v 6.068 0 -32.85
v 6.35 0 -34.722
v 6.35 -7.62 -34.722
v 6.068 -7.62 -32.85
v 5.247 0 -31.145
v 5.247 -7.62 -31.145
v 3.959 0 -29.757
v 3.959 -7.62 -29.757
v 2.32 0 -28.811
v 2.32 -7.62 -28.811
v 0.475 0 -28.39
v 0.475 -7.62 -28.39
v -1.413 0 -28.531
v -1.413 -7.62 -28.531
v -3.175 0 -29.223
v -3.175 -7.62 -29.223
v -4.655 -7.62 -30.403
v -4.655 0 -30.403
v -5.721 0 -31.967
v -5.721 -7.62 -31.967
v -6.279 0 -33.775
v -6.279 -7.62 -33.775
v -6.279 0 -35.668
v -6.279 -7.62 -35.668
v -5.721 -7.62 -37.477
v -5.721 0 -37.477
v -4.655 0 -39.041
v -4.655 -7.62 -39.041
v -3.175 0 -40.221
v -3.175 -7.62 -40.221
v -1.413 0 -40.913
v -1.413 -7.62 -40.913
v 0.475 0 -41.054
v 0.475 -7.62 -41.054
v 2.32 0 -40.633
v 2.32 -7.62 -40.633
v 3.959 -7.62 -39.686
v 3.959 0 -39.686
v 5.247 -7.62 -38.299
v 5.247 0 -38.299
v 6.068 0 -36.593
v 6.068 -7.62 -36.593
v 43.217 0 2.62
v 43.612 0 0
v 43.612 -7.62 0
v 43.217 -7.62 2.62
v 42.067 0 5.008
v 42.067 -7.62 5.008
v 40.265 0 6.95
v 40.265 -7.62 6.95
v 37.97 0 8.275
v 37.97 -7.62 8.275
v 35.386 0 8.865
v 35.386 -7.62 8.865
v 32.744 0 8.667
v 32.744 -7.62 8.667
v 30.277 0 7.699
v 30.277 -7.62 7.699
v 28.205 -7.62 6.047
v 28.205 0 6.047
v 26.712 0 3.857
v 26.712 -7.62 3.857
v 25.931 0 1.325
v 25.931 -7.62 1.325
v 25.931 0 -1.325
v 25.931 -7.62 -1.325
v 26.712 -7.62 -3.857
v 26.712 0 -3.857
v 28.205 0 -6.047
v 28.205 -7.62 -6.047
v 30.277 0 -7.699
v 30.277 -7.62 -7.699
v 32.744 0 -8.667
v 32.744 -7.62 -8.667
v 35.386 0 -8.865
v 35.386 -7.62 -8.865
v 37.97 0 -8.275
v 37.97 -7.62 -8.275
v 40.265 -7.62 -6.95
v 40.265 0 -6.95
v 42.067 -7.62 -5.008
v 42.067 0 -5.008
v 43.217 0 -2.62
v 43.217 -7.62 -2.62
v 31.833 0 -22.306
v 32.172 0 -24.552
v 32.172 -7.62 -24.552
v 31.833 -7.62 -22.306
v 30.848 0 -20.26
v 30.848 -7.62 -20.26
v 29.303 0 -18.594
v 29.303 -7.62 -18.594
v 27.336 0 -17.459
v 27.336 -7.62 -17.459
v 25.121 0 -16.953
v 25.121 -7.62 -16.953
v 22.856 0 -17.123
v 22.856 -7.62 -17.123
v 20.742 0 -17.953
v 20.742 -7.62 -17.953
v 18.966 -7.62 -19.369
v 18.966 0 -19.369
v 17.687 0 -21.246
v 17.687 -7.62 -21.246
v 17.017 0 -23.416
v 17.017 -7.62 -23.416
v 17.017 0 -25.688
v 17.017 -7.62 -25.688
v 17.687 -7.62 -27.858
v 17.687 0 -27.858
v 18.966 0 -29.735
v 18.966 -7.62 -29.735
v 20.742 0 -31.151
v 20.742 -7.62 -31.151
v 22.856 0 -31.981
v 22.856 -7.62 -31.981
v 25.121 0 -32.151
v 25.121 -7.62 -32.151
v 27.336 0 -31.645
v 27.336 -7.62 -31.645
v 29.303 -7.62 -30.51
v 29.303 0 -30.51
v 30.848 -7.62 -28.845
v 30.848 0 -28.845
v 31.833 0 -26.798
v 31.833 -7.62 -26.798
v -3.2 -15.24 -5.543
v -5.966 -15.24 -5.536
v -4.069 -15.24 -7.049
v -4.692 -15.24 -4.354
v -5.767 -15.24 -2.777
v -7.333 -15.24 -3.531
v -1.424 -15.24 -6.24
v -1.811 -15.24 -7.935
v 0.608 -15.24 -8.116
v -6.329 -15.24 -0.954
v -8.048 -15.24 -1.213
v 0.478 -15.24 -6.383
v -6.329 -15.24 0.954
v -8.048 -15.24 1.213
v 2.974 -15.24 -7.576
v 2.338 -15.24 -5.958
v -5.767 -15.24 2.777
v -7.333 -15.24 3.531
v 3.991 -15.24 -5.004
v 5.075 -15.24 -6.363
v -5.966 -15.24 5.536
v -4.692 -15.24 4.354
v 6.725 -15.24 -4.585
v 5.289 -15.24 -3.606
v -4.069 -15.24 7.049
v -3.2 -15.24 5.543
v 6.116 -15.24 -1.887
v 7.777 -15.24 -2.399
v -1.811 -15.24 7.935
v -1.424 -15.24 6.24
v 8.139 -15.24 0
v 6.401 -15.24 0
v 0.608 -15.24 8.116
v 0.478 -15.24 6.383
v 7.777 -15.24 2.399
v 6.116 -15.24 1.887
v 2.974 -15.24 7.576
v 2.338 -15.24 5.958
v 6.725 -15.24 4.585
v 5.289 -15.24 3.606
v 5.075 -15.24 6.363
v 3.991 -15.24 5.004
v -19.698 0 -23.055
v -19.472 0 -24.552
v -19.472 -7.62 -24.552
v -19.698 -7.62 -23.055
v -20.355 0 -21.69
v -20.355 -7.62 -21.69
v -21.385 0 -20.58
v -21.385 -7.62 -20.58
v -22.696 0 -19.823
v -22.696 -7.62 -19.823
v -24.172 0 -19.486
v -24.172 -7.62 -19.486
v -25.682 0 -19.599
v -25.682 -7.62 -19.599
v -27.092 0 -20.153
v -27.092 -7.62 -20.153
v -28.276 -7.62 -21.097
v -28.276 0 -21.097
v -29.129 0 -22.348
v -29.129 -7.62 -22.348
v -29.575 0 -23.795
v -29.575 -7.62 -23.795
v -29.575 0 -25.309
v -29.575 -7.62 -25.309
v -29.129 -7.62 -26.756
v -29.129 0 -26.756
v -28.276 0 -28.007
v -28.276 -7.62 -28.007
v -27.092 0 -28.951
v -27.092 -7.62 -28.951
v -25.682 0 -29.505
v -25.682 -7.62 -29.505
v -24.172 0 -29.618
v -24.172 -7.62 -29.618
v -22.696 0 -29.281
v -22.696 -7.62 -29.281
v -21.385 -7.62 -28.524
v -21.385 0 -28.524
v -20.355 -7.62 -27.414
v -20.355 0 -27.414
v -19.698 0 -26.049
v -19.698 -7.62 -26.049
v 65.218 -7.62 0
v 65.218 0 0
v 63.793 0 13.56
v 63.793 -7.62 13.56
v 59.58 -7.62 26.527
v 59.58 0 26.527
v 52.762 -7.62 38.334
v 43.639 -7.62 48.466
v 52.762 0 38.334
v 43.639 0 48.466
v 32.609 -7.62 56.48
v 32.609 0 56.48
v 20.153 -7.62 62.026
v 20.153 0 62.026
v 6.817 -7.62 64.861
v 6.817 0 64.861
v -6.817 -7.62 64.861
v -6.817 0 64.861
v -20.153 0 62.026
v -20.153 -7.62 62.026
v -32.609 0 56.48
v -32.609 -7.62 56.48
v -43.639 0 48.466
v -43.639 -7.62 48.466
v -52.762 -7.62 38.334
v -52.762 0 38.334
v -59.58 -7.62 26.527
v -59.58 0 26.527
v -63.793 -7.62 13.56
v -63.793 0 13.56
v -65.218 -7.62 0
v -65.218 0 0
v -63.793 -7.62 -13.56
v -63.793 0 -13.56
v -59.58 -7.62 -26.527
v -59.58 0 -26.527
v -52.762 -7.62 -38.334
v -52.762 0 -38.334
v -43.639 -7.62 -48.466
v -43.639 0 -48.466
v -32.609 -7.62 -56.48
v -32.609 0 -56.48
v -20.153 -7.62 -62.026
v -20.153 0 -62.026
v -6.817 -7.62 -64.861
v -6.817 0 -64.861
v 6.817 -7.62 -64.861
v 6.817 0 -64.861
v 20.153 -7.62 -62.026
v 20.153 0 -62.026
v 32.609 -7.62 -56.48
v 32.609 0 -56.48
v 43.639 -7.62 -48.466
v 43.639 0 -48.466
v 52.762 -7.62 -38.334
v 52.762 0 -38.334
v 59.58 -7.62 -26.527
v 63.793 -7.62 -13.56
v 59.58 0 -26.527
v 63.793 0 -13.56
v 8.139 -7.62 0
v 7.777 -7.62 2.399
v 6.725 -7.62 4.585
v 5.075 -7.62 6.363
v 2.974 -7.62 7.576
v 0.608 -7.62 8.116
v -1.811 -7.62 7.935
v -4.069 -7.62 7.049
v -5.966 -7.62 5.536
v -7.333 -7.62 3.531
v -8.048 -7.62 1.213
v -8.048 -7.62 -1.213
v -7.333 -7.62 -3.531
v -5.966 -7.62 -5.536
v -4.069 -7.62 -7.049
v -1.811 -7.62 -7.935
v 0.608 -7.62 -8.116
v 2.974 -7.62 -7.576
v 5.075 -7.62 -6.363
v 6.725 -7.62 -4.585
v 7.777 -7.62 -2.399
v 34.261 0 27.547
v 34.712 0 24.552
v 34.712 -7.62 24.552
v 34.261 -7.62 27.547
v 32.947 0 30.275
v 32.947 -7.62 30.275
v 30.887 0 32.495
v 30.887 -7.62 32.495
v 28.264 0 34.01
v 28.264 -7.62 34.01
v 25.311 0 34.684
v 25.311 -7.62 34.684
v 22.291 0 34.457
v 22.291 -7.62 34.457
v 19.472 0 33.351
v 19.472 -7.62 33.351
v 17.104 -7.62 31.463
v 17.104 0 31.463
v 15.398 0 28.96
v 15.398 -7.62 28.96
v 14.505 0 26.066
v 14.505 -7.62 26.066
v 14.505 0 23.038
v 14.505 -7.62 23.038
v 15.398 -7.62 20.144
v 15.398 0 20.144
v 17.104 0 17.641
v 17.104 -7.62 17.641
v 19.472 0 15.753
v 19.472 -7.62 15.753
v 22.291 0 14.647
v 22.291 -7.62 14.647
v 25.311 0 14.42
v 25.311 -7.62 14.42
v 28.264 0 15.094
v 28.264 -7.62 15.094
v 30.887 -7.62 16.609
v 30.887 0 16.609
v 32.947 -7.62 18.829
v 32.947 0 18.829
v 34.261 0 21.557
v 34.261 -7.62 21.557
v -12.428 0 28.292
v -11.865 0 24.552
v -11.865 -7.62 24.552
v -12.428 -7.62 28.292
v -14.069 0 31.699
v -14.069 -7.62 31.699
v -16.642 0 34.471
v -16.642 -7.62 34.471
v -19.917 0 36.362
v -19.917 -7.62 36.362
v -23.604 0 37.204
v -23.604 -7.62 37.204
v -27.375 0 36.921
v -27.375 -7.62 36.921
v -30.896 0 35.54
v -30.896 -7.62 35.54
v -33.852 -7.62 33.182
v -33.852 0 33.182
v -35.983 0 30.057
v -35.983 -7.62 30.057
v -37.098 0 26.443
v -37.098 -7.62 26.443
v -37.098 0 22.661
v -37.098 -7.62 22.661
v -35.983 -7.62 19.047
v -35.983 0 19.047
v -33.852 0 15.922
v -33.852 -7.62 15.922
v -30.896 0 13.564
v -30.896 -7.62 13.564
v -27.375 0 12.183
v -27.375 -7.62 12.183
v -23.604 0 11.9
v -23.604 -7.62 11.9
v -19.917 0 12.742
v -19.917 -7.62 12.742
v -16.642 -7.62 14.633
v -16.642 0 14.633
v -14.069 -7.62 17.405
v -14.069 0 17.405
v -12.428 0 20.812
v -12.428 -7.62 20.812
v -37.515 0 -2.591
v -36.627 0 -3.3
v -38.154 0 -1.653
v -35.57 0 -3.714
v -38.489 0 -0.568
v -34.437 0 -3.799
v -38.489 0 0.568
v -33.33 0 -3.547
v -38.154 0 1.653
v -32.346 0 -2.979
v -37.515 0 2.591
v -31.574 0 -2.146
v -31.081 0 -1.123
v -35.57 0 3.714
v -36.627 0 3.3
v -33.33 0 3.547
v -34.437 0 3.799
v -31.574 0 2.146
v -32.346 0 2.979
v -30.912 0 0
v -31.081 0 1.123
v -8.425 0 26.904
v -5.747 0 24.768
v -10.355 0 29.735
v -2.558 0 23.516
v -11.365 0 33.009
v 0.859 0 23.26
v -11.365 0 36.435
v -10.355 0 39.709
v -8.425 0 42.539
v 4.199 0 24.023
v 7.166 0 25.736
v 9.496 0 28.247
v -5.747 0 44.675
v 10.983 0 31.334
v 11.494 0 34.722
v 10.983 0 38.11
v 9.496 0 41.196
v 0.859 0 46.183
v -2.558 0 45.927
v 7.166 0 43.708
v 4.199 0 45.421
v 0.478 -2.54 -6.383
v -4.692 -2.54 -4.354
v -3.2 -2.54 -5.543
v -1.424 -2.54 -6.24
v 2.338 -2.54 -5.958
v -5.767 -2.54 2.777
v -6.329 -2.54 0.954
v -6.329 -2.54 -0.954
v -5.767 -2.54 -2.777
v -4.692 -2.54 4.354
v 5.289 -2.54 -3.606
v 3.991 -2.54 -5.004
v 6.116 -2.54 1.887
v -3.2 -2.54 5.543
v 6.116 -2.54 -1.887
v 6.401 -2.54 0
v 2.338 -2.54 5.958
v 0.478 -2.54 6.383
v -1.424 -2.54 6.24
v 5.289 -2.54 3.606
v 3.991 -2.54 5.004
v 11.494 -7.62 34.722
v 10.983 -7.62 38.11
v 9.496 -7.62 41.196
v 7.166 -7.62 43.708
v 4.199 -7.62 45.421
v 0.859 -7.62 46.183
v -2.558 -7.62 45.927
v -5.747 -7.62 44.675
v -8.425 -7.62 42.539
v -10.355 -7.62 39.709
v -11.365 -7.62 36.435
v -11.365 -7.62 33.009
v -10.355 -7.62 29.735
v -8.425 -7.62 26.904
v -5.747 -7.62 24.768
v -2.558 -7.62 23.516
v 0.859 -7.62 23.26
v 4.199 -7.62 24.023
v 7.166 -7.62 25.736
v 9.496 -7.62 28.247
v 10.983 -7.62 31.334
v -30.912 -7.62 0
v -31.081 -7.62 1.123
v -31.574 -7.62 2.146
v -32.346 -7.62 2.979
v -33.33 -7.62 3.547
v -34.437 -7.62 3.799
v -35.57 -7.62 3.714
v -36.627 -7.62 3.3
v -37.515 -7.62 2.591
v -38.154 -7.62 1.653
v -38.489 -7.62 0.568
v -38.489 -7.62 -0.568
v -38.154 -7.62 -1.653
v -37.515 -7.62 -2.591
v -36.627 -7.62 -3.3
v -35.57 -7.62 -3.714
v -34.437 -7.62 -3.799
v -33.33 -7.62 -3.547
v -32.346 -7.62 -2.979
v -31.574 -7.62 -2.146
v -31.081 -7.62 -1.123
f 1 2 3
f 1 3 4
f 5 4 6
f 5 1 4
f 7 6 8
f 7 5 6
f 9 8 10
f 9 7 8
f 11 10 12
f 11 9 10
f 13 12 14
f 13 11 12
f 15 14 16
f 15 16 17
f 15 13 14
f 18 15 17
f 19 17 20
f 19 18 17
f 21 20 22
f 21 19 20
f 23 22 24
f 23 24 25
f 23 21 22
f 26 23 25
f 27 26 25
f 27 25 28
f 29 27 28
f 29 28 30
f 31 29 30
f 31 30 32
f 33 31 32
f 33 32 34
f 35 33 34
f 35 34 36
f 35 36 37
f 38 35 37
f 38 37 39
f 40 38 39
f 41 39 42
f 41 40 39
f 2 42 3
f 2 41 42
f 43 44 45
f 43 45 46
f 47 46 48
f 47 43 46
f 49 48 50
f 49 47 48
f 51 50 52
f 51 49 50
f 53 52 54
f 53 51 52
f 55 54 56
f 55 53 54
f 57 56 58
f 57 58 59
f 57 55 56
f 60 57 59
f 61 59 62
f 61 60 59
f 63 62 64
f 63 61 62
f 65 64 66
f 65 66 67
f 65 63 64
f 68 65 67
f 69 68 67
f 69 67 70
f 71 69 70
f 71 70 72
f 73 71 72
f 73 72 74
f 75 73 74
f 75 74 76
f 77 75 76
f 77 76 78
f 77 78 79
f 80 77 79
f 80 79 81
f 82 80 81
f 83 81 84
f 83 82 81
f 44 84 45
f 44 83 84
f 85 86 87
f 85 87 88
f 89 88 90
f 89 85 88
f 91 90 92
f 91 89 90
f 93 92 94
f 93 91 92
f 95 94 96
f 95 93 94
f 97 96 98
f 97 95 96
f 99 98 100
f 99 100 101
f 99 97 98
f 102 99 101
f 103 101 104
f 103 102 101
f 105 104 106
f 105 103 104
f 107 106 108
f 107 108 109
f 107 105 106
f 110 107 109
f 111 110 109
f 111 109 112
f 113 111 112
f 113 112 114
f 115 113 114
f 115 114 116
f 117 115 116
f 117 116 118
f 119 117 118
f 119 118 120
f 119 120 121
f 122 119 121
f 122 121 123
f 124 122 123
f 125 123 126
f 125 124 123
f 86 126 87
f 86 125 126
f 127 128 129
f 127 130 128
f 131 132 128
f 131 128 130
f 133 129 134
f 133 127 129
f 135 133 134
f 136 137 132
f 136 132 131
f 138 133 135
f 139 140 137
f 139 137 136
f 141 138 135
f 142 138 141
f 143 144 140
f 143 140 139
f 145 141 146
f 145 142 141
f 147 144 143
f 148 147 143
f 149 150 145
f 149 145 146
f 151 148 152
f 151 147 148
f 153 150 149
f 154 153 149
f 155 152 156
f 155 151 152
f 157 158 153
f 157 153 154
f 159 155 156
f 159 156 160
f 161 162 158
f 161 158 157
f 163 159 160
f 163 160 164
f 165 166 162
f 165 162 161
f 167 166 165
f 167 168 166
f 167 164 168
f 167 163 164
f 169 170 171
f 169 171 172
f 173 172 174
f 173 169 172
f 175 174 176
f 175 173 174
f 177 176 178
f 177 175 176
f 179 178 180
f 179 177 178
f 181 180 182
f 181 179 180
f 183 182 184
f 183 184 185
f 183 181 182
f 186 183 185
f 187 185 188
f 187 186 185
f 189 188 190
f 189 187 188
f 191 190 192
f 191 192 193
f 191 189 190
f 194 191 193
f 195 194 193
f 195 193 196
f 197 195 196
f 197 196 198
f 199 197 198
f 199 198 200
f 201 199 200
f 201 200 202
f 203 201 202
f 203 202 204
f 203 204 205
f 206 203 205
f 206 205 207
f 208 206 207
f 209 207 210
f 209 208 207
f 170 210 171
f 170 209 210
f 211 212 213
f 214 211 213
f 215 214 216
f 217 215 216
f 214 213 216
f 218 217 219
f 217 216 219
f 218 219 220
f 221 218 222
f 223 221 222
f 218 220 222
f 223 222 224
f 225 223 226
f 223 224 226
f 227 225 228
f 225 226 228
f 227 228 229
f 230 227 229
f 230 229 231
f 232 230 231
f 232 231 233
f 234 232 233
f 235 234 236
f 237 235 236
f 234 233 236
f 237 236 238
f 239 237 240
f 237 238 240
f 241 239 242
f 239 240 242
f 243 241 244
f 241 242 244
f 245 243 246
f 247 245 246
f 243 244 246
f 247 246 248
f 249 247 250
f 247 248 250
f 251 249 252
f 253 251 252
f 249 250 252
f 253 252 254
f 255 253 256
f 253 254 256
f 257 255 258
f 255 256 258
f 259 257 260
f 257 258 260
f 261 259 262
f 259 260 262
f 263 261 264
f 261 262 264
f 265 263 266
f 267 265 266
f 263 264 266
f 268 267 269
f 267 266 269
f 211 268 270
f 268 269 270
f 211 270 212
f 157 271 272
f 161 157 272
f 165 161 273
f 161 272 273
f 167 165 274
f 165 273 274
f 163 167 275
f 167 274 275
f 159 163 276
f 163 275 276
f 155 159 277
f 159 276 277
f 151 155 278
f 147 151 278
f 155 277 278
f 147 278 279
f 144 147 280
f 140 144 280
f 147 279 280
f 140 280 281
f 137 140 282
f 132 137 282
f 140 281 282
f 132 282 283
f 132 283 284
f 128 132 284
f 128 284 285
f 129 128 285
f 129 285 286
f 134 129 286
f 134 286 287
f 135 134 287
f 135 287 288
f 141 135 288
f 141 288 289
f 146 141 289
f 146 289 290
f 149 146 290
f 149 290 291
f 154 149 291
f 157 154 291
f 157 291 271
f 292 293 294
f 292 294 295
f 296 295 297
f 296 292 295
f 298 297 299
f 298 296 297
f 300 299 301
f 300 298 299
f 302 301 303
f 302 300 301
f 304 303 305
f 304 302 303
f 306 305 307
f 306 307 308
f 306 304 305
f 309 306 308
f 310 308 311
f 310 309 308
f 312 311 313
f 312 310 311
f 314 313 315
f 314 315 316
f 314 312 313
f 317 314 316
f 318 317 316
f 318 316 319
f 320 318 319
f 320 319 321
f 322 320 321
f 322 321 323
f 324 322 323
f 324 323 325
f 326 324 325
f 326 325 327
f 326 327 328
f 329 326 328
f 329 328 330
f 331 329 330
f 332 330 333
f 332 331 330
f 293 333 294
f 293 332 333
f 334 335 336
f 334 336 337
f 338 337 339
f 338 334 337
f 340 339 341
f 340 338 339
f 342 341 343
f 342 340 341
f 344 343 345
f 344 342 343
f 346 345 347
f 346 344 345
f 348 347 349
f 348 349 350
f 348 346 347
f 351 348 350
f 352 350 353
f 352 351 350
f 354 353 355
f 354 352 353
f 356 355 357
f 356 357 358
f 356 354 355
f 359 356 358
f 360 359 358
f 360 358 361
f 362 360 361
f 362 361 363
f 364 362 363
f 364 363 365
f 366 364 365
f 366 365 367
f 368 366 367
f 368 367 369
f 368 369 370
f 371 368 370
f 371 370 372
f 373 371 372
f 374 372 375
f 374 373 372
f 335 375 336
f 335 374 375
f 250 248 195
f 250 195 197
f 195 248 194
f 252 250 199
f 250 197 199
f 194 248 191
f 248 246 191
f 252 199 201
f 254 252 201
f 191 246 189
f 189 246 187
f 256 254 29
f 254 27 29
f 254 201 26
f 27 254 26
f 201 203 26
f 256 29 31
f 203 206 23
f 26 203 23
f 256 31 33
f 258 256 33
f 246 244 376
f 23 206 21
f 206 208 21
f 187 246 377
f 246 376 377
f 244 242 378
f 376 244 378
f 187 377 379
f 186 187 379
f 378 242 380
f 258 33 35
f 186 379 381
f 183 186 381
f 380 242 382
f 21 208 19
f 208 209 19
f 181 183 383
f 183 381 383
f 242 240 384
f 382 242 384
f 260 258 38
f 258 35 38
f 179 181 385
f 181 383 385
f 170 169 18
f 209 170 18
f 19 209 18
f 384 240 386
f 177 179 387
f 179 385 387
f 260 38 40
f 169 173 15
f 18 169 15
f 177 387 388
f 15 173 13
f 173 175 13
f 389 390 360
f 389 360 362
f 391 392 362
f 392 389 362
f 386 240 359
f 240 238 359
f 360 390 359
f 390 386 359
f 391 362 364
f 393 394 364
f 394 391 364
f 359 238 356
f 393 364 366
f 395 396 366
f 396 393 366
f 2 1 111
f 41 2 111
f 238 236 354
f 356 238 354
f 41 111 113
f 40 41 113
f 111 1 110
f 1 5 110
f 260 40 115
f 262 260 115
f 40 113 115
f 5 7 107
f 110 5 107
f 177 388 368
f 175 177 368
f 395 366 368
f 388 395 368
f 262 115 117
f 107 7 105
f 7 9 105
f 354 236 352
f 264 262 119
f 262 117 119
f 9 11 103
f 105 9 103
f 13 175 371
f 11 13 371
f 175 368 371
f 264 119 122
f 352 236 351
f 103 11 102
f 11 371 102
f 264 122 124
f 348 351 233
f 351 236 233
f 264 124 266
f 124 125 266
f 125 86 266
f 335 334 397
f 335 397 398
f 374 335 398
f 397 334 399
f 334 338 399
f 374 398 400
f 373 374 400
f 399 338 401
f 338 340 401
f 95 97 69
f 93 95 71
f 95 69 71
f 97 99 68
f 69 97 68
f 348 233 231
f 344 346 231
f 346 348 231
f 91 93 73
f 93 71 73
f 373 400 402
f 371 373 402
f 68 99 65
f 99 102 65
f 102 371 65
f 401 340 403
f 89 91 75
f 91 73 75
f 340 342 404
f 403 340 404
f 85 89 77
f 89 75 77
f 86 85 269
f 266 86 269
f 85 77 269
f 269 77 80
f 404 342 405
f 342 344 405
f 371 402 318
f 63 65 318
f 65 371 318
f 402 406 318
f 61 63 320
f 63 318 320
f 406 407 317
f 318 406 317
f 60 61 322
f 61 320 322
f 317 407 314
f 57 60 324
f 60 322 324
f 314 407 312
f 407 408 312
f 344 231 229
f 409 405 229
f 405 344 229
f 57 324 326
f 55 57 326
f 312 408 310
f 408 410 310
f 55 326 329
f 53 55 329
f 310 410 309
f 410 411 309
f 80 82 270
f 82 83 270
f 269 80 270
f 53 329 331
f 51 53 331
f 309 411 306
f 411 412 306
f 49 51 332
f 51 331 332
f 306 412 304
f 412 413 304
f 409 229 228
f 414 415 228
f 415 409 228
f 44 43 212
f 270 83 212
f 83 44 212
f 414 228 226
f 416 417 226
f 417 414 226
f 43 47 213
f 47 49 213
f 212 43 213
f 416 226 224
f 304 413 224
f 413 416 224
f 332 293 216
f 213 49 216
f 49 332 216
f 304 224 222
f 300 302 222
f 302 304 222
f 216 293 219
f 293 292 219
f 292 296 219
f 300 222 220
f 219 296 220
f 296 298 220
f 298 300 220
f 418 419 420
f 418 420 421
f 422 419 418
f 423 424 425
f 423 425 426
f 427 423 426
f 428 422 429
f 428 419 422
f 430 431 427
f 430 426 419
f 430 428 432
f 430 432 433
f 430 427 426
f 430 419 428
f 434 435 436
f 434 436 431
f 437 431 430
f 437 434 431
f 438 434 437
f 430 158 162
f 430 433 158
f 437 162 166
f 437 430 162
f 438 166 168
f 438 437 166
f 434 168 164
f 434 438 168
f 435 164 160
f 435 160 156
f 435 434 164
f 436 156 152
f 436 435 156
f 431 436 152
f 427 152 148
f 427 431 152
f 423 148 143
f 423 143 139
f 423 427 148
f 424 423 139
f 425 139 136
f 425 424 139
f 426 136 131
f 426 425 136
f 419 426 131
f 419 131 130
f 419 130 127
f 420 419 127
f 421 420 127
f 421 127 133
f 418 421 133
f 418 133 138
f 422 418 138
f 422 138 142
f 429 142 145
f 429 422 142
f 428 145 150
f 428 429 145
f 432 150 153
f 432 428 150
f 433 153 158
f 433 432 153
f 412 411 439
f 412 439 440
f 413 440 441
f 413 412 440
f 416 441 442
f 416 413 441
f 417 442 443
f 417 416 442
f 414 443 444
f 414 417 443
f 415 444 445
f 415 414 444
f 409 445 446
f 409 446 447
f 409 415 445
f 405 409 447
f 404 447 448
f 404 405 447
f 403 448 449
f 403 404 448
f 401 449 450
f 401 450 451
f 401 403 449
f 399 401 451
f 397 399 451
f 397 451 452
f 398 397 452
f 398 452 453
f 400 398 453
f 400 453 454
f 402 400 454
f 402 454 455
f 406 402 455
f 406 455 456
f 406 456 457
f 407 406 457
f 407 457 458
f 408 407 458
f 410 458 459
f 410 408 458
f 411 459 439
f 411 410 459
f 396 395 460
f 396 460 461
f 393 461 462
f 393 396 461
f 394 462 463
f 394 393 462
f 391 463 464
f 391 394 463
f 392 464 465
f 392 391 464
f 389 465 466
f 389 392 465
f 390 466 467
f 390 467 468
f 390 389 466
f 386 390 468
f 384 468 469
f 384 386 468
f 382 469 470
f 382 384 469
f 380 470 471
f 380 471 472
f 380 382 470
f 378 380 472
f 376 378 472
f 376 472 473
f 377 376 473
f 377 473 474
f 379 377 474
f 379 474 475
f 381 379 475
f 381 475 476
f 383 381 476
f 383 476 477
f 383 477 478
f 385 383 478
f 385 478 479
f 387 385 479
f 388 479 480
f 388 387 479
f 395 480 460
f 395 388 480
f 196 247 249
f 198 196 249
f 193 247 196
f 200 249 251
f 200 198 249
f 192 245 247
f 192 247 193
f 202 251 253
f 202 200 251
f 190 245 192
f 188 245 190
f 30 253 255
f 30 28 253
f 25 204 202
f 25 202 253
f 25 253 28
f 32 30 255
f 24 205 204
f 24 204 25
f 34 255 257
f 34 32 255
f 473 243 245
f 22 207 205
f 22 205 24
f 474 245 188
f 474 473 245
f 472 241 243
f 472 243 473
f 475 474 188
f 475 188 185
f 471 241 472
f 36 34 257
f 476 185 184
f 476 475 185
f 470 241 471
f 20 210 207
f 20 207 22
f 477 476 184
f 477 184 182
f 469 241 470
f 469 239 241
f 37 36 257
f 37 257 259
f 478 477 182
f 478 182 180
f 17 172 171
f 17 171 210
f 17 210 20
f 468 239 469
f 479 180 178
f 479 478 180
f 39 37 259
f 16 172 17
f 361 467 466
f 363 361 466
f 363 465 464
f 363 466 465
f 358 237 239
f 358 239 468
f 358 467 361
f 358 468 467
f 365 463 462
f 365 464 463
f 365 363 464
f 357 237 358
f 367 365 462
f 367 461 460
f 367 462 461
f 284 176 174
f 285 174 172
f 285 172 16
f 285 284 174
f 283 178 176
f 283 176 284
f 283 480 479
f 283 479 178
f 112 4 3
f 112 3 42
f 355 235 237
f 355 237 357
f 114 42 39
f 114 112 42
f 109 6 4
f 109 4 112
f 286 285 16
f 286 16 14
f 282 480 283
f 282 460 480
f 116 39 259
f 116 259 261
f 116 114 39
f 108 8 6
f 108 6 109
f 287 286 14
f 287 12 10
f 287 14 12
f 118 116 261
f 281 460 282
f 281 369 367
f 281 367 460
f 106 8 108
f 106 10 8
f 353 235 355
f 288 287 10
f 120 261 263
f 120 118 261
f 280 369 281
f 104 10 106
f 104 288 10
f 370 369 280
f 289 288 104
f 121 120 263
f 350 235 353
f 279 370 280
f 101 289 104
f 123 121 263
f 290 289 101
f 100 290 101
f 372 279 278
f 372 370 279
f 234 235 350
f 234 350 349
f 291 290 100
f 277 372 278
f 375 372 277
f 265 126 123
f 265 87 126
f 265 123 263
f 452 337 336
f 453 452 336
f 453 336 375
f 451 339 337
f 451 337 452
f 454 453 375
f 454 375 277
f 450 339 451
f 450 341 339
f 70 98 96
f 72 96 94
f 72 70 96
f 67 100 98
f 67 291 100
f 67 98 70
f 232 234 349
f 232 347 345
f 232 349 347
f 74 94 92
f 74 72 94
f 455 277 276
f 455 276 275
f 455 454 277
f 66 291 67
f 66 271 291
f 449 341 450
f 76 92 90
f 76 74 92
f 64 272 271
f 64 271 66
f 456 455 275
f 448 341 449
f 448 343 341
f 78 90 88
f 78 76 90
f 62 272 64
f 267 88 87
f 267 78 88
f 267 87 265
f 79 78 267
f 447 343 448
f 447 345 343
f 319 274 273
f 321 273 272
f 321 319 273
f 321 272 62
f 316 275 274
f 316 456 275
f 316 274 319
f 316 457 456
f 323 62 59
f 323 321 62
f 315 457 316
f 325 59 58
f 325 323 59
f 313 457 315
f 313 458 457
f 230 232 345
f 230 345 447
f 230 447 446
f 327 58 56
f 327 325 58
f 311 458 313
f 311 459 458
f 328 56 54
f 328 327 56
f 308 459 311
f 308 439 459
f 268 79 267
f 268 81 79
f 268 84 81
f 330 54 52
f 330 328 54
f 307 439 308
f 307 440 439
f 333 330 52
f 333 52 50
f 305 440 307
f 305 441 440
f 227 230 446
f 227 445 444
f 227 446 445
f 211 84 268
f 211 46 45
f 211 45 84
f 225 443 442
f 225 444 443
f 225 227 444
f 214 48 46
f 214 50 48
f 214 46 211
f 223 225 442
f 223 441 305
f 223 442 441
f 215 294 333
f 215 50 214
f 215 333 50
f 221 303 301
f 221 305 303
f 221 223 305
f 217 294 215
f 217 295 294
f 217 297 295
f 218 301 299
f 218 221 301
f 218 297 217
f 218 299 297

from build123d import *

# Parameters (mm, degrees)
F0_R      = 65.21802
F0_R_2    = 5.08
F0_R_3    = 6.35
F0_R_4    = 7.62
F0_R_5    = 3.81
F0_R_6    = 12.6873
F0_R_7    = 10.16
F0_R_8    = 8.89
F0_R_9    = 11.4935
F1_DEPTH  = 7.62
F2_R      = 8.138999
F2_R_2    = 6.4008
F3_DEPTH  = 15.24
F3_FACE_R = 6.4008
F4_DEPTH  = 5.08


with BuildPart() as f1:
    # F0 (on Front) → F1 (new body)
    with BuildSketch(Plane.XZ):
        Circle(F0_R)
        with Locations((-24.55202, -24.55202)):
            Circle(F0_R_2, mode=Mode.SUBTRACT)
        with Locations((0, -34.7218)):
            Circle(F0_R_3, mode=Mode.SUBTRACT)
        with Locations((24.55202, -24.55202)):
            Circle(F0_R_4, mode=Mode.SUBTRACT)
        with Locations((-34.7218, 0)):
            Circle(F0_R_5, mode=Mode.SUBTRACT)
        with Locations((-24.55202, 24.55202)):
            Circle(F0_R_6, mode=Mode.SUBTRACT)
        with Locations((24.55202, 24.55202)):
            Circle(F0_R_7, mode=Mode.SUBTRACT)
        with Locations((34.7218, 0)):
            Circle(F0_R_8, mode=Mode.SUBTRACT)
        with Locations((0, 34.7218)):
            Circle(F0_R_9, mode=Mode.SUBTRACT)
    extrude(amount=F1_DEPTH)

    # F2 (on Front) → F3 (join)
    with BuildSketch(Plane.XZ):
        Circle(F2_R)
        Circle(F2_R_2, mode=Mode.SUBTRACT)
    extrude(amount=F3_DEPTH)

    # F3_face (on face) → F4 (cut)
    with BuildSketch(Plane.XZ.offset(7.62)):
        Circle(F3_FACE_R)
    extrude(amount=-F4_DEPTH, mode=Mode.SUBTRACT)


solid = f1.part
